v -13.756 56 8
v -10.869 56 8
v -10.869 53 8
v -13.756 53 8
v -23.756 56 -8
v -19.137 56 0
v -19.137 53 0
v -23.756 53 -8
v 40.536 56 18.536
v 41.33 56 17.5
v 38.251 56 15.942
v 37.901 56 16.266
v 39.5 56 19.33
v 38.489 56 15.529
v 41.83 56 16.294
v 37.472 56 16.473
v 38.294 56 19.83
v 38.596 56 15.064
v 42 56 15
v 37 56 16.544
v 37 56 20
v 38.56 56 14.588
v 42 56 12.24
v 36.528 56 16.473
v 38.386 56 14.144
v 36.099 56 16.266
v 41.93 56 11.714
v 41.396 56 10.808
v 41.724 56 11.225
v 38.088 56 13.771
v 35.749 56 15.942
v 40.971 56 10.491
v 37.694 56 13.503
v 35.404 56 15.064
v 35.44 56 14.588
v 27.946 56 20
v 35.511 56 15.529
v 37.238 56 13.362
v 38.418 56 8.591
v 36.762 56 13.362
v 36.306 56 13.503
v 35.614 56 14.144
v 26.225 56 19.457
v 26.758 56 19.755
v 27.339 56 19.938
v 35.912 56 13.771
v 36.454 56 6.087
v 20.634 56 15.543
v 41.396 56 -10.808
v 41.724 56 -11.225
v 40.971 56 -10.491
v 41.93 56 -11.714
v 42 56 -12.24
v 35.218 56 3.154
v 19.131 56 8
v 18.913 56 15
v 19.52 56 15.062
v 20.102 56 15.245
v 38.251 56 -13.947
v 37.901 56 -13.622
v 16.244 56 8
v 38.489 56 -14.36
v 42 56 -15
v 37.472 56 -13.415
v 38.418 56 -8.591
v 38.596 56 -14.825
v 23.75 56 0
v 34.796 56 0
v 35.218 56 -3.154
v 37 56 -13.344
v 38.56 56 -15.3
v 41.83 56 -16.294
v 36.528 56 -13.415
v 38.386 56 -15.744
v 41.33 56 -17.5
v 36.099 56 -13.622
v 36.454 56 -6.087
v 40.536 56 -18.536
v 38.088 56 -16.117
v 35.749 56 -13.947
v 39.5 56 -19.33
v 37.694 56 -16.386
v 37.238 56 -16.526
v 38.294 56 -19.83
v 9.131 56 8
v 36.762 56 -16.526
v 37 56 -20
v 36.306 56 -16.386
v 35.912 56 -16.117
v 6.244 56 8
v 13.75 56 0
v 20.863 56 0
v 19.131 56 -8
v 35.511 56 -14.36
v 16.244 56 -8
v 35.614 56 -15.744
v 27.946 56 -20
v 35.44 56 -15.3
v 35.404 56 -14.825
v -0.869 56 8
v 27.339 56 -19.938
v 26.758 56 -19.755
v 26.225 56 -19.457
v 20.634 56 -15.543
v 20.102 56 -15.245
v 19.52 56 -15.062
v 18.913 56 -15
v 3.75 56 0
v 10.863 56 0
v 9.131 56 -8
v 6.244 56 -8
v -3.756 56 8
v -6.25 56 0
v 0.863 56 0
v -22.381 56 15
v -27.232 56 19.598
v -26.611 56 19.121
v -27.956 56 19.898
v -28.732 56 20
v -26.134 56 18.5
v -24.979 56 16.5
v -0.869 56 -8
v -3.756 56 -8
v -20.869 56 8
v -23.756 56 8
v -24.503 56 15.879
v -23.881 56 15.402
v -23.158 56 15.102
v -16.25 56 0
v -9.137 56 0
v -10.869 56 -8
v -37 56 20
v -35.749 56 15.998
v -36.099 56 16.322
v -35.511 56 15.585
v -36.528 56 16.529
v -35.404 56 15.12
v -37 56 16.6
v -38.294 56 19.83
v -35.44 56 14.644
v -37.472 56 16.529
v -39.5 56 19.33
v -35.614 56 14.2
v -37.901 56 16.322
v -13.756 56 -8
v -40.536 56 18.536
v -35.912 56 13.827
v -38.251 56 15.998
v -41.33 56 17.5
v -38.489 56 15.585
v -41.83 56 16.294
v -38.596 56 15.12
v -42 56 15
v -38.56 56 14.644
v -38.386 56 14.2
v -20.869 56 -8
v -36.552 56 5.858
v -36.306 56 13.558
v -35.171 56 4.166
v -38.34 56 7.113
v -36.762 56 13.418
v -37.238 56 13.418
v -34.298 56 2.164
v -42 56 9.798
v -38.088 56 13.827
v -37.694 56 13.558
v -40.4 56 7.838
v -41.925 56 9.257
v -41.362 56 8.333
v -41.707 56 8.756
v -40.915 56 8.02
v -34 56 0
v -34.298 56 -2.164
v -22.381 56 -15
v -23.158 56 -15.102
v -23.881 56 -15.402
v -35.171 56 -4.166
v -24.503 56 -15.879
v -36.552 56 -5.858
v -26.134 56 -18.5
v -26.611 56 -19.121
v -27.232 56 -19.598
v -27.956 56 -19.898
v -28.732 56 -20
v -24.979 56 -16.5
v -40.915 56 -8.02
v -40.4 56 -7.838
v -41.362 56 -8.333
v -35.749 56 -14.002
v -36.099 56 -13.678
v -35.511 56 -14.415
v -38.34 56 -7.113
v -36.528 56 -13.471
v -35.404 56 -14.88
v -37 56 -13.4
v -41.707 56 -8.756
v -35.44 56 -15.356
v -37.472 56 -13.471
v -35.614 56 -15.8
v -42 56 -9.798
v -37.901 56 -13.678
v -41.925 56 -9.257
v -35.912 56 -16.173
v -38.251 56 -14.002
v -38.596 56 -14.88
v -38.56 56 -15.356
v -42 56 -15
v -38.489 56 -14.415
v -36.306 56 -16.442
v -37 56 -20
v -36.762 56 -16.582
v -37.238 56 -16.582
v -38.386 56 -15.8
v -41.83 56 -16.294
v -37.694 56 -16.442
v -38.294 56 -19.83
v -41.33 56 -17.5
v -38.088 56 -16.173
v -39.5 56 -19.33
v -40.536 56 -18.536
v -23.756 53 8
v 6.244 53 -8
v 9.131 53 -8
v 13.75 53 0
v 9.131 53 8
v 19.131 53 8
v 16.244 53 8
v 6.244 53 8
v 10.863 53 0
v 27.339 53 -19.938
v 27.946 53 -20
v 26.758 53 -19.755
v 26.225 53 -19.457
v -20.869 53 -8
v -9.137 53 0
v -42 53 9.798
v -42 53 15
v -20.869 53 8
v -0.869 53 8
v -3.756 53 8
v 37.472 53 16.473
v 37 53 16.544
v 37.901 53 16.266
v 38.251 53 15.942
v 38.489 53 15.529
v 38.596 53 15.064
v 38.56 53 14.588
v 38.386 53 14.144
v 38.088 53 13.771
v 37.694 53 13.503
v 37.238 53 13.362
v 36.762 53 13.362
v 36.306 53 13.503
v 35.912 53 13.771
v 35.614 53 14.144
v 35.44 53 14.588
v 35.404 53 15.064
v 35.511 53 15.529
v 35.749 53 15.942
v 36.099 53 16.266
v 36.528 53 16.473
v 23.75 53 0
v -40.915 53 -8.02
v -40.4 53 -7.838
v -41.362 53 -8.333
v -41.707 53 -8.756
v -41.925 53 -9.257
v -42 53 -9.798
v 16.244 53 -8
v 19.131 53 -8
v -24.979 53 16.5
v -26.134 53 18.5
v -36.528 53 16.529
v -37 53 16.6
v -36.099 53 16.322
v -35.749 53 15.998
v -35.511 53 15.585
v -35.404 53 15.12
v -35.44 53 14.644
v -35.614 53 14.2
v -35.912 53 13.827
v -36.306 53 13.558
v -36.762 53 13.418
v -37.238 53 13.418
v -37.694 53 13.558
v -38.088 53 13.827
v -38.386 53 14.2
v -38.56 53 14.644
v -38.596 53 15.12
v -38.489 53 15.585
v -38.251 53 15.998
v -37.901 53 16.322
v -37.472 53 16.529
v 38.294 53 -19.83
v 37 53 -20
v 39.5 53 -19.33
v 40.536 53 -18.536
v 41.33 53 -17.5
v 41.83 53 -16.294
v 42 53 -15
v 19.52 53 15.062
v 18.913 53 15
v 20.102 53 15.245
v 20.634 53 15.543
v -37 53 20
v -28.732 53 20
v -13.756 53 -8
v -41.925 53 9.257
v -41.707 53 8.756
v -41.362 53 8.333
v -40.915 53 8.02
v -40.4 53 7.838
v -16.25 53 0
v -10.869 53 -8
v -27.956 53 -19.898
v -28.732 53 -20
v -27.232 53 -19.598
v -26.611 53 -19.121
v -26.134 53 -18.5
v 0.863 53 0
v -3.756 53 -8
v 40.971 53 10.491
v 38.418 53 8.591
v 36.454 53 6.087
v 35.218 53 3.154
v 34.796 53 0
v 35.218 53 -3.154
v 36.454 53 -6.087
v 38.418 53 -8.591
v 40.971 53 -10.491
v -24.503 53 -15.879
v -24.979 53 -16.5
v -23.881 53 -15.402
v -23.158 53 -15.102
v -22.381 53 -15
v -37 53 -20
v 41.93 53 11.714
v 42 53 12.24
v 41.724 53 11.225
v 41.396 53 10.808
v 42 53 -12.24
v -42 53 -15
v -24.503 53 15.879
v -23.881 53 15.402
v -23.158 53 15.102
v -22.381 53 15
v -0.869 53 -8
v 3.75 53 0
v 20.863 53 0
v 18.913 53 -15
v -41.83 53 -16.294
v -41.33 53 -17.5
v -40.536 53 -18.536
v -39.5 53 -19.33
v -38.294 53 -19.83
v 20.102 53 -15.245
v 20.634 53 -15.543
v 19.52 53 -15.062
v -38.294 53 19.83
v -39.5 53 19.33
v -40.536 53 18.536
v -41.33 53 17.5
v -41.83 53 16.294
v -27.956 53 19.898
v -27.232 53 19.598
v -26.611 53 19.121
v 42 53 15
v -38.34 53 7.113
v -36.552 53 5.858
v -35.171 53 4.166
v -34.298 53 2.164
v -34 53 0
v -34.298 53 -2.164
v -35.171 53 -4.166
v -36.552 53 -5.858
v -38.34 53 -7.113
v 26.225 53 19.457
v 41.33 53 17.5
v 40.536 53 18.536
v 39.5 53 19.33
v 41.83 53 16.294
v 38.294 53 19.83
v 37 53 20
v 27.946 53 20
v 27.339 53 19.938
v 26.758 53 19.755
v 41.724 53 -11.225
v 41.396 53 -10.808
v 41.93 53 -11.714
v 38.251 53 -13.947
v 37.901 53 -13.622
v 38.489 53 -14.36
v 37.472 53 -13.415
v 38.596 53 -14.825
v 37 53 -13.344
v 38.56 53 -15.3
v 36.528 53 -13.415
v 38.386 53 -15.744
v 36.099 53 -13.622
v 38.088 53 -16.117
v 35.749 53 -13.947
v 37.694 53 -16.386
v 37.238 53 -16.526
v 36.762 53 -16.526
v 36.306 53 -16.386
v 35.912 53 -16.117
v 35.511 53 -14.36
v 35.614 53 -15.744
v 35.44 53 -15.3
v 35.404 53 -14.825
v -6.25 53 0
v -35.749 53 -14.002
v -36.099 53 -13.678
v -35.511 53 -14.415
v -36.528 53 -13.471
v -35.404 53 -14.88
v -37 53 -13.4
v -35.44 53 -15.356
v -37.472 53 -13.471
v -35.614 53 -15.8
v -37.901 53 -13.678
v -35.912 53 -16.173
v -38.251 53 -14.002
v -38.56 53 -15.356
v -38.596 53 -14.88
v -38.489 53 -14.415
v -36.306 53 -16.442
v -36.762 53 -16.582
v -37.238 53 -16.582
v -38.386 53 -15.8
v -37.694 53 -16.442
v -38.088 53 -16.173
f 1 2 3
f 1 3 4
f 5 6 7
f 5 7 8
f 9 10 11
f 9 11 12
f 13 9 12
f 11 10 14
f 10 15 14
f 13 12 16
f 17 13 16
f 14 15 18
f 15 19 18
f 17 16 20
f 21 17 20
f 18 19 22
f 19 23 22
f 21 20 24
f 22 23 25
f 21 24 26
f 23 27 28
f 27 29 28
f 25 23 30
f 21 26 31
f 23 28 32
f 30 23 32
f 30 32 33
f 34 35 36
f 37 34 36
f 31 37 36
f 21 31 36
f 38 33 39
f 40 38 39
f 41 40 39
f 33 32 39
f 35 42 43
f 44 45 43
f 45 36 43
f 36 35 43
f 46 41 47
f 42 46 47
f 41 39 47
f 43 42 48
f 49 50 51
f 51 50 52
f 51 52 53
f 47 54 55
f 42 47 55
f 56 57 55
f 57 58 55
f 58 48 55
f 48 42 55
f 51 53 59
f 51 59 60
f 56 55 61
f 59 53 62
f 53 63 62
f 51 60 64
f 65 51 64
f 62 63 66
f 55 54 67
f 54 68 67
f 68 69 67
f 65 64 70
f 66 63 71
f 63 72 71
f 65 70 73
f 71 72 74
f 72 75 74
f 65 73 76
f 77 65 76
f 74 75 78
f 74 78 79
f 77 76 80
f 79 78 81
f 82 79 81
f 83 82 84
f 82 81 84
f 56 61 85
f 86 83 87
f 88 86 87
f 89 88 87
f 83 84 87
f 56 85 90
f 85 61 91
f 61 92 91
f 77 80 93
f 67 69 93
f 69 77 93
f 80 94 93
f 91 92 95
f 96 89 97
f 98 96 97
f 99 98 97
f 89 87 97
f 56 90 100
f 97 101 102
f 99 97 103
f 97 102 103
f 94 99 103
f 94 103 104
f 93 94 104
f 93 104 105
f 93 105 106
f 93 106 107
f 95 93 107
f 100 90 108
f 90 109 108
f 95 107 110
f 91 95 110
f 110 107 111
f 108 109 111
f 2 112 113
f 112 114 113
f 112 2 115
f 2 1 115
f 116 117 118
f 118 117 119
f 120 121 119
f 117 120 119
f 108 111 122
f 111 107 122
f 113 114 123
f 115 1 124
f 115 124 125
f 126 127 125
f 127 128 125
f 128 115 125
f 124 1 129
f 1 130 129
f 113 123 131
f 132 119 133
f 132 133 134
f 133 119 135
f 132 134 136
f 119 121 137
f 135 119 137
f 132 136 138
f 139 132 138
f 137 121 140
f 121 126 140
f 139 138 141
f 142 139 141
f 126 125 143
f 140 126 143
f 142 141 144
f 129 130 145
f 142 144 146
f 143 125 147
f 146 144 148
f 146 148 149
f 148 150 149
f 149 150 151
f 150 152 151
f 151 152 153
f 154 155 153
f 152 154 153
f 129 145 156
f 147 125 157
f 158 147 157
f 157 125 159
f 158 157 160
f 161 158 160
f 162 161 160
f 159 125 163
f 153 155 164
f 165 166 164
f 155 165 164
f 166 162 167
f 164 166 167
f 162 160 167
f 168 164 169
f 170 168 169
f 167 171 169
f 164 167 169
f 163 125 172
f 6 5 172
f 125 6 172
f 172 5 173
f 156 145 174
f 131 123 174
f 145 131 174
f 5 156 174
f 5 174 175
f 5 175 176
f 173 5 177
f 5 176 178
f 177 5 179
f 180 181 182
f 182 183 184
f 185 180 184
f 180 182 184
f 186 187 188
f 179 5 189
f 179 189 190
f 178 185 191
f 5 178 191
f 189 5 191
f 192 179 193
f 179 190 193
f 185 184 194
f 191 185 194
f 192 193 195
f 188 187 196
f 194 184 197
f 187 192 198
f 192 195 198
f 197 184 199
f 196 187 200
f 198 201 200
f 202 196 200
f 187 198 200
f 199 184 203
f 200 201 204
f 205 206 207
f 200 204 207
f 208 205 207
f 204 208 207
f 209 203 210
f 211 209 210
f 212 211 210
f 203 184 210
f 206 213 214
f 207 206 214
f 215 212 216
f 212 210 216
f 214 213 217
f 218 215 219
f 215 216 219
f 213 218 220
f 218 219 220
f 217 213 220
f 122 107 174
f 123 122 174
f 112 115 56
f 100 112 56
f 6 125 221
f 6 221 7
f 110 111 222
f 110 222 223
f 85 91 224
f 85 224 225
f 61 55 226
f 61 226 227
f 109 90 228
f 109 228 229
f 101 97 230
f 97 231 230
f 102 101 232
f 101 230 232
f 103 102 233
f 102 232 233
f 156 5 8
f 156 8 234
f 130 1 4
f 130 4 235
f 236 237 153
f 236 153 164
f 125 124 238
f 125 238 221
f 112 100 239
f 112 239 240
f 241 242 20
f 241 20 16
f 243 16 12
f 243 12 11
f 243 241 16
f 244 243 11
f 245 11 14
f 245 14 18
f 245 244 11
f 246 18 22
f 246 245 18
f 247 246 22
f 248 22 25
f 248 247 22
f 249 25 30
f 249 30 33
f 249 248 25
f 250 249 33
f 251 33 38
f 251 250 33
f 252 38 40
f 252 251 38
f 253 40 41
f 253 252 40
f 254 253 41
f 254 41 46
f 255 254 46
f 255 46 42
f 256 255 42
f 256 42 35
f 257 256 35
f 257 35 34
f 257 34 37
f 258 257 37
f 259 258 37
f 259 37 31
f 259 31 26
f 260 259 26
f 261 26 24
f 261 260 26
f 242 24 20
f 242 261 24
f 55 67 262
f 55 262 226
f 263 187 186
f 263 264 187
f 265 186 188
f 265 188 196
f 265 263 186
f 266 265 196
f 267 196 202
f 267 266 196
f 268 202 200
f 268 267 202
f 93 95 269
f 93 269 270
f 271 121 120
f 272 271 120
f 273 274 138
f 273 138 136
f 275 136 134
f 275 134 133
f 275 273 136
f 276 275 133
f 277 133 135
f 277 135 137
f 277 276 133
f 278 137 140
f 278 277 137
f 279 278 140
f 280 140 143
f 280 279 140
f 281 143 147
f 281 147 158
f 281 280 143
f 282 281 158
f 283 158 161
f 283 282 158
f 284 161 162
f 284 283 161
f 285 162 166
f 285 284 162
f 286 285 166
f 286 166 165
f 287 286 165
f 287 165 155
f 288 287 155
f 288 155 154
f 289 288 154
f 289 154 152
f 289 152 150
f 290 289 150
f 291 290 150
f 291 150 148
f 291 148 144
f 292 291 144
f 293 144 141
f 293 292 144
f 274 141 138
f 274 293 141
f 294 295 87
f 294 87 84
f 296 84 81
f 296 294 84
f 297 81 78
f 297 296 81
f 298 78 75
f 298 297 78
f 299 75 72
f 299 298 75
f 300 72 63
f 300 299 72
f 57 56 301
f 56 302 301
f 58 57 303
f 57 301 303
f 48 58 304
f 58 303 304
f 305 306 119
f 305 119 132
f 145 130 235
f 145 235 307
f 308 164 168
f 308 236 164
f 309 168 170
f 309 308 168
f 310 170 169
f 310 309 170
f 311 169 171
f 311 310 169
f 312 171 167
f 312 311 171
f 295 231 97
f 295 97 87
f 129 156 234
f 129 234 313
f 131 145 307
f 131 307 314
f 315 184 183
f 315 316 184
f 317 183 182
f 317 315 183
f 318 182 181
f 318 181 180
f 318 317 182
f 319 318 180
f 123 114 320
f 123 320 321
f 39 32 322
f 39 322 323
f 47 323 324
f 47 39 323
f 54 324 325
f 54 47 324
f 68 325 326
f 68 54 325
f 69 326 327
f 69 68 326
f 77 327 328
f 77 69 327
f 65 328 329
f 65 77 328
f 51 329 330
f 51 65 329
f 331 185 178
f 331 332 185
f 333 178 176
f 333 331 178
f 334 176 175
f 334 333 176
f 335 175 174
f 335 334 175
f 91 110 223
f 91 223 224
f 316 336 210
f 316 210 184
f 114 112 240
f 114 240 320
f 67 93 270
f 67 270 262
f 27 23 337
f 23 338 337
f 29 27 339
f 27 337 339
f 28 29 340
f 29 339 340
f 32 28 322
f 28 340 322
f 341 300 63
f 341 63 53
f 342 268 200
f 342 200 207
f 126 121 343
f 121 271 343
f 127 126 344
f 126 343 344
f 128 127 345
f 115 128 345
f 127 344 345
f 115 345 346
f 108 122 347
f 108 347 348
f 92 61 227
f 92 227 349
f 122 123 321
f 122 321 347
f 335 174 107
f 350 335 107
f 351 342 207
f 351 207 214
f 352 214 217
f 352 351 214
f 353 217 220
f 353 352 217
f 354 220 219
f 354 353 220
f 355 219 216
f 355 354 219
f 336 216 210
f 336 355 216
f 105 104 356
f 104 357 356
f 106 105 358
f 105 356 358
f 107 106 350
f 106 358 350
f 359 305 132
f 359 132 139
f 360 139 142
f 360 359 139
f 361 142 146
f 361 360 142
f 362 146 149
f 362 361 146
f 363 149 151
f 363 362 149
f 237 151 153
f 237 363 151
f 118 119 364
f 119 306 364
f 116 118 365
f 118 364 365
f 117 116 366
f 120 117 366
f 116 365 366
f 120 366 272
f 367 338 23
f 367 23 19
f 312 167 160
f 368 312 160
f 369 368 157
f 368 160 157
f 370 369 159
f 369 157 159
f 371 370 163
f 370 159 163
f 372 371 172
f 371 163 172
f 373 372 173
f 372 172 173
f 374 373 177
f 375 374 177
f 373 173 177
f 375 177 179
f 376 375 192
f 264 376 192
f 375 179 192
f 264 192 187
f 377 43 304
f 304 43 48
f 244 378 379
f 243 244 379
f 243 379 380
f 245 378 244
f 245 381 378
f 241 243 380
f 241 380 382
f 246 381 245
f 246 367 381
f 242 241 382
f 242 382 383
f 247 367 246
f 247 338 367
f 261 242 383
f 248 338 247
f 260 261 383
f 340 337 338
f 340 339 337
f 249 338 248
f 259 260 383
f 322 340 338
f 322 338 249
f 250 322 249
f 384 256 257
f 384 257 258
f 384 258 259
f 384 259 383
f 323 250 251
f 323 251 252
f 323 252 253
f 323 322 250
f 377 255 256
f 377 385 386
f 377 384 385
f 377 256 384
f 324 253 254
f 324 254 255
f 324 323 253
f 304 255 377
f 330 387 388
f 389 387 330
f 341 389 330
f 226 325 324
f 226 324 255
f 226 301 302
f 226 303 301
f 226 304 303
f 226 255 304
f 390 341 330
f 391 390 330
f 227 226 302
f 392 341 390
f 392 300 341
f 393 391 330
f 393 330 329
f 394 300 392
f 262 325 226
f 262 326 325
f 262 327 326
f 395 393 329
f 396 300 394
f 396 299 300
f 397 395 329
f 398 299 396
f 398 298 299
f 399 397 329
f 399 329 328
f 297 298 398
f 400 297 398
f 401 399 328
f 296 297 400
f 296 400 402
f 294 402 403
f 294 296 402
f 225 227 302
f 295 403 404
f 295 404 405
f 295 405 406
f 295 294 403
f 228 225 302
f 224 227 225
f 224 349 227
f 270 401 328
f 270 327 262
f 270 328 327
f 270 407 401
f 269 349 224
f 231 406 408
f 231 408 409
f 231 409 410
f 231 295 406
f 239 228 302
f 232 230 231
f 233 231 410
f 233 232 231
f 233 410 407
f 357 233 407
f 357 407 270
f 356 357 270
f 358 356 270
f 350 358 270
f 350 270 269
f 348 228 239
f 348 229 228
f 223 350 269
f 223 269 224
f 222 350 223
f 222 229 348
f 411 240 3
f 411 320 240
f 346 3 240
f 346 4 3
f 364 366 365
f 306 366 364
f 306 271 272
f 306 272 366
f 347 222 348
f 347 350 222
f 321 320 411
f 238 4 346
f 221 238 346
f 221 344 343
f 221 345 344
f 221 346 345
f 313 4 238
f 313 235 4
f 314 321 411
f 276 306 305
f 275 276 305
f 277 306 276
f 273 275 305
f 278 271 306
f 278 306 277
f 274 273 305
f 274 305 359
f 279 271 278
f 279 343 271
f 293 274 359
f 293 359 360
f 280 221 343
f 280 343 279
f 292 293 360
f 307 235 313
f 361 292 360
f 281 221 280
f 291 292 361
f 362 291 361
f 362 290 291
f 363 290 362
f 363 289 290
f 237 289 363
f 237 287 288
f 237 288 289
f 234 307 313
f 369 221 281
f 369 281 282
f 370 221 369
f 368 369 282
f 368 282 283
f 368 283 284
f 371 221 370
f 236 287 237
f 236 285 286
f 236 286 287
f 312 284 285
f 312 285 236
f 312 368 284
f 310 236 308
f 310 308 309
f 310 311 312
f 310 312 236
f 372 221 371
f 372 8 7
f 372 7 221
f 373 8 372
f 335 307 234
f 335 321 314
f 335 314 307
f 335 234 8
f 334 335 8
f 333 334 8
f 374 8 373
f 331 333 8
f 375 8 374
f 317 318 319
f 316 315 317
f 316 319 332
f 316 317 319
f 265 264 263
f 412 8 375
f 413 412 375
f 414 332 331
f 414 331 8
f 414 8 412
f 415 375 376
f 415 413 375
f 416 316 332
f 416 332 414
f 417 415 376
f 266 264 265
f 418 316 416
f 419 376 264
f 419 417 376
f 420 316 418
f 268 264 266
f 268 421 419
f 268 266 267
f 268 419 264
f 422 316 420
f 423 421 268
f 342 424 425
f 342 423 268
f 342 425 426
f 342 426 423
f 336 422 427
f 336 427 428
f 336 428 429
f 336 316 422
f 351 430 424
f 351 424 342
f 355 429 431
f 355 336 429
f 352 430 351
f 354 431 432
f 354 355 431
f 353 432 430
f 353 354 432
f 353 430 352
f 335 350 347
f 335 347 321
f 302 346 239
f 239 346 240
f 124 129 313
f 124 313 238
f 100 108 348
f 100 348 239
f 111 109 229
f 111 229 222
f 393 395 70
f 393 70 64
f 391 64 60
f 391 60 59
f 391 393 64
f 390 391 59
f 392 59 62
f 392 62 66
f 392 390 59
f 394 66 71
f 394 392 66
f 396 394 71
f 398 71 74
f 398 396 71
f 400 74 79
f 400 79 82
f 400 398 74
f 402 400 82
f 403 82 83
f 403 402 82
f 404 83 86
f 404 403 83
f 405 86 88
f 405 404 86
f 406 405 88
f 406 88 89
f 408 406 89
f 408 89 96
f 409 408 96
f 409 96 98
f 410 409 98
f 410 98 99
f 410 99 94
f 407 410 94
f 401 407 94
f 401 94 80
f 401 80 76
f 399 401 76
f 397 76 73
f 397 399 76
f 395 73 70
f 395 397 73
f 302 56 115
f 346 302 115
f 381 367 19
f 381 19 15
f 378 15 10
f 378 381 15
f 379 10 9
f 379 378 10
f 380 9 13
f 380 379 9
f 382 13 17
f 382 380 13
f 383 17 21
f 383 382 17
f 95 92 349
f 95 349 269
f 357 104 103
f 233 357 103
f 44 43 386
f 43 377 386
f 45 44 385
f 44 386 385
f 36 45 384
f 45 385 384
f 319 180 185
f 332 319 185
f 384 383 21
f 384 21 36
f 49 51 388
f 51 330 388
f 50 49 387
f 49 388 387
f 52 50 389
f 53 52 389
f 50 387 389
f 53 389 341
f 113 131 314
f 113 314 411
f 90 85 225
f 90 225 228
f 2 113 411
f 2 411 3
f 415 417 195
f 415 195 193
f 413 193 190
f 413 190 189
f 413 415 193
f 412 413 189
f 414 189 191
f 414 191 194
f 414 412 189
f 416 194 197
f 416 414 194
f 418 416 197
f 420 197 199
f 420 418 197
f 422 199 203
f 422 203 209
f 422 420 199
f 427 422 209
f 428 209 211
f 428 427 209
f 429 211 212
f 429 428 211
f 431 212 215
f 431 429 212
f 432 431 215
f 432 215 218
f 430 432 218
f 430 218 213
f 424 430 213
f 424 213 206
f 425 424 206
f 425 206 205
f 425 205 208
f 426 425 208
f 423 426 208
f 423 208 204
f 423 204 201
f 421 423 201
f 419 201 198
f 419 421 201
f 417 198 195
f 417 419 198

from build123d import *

# Parameters (mm, degrees)
SKETCH1_R           = 1.6
BOSS_EXTRUDE1_DEPTH = 3
CUT_EXTRUDE1_DEPTH  = 3
FILLET1_R           = 3
CUT_EXTRUDE2_DEPTH  = 47.615448083
FILLET2_R           = 2


with BuildPart() as part:
    # Sketch1 → Boss-Extrude1 (new body)
    with BuildSketch(Plane(origin=(0, 53, 0), x_dir=(1, 0, 0), z_dir=(0, 1, 0))):
        with BuildLine():
            Line((-37, 20), (37, 20))
            ThreePointArc((37, 20), (40.535533906, 18.535533906), (42, 15))
            Line((42, 15), (42, -15))
            ThreePointArc((42, -15), (40.535533906, -18.535533906), (37, -20))
            Line((37, -20), (-37, -20))
            ThreePointArc((-37, -20), (-40.535533906, -18.535533906), (-42, -15))
            Line((-42, -15), (-42, 15))
            ThreePointArc((-42, 15), (-40.535533906, 18.535533906), (-37, 20))
        make_face()
        with Locations(Location((37, 14.944086969, 0), (0, 0, 270))):
            Circle(SKETCH1_R, mode=Mode.SUBTRACT)
        with Locations(Location((37, -14.944086969, 0), (0, 0, 270))):
            Circle(SKETCH1_R, mode=Mode.SUBTRACT)
        with Locations(Location((-37, -15, 0), (0, 0, 270))):
            Circle(SKETCH1_R, mode=Mode.SUBTRACT)
        with Locations(Location((-37, 15, 0), (0, 0, 270))):
            Circle(SKETCH1_R, mode=Mode.SUBTRACT)
    extrude(amount=BOSS_EXTRUDE1_DEPTH)

    # Sketch2 → Cut-Extrude1 (cut)
    with BuildSketch(Plane(origin=(0, 56, 0), x_dir=(1, 0, 0), z_dir=(0, 1, 0))):
        Polygon((-27, 20), (-24.113248654, 15), (19.859259966, 15), (27, 20), align=None)
        Polygon((-27, -20), (27, -20), (19.859259966, -15), (-24.113248654, -15), align=None)
        with BuildLine():
            Line((42, 11), (42, -11))
            ThreePointArc((42, -11), (34.795831523, 0), (42, 11))
        make_face()
        with BuildLine():
            Line((-42, 8), (-42, -8))
            ThreePointArc((-42, -8), (-34, 0), (-42, 8))
        make_face()
    extrude(amount=-CUT_EXTRUDE1_DEPTH, mode=Mode.SUBTRACT)

    # Fillet1
    fillet1_edges = [part.edges().sort_by_distance(p)[0] for p in [
        (-24.113248654, 54.5, -15),
        (19.859259966, 54.5, -15),
        (27, 54.5, -20),
        (-27, 54.5, -20),
        (27, 54.5, 20),
        (19.859259966, 54.5, 15),
        (-24.113248654, 54.5, 15),
        (-27, 54.5, 20),
    ]]
    fillet(fillet1_edges, radius=FILLET1_R)

    # Sketch3 → Cut-Extrude2 (cut, through all)
    with BuildSketch(Plane(origin=(0, 56, 0), x_dir=(1, 0, 0), z_dir=(0, 1, 0))):
        Polygon((20.863248654, 0), (16.244446501, 8), (19.131197846, 8), (23.75, 0), (19.131197846, -8), (16.244446501, -8), align=None)
        Polygon((10.863248654, 0), (6.244446501, 8), (9.131197846, 8), (13.75, 0), (9.131197846, -8), (6.244446501, -8), align=None)
        Polygon((0.863248654, 0), (-3.755553499, 8), (-0.868802154, 8), (3.75, 0), (-0.868802154, -8), (-3.755553499, -8), align=None)
        Polygon((-9.136751346, 0), (-13.755553499, 8), (-10.868802154, 8), (-6.25, 0), (-10.868802154, -8), (-13.755553499, -8), align=None)
        Polygon((-19.136751346, 0), (-23.755553499, 8), (-20.868802154, 8), (-16.25, 0), (-20.868802154, -8), (-23.755553499, -8), align=None)
    extrude(amount=-CUT_EXTRUDE2_DEPTH, mode=Mode.SUBTRACT)

    # Fillet2
    fillet2_edges = [part.edges().sort_by_distance(p)[0] for p in [
        (42, 54.5, -11),
        (42, 54.5, 11),
        (-42, 54.5, 8),
        (-42, 54.5, -8),
    ]]
    fillet(fillet2_edges, radius=FILLET2_R)


solid = part.part
